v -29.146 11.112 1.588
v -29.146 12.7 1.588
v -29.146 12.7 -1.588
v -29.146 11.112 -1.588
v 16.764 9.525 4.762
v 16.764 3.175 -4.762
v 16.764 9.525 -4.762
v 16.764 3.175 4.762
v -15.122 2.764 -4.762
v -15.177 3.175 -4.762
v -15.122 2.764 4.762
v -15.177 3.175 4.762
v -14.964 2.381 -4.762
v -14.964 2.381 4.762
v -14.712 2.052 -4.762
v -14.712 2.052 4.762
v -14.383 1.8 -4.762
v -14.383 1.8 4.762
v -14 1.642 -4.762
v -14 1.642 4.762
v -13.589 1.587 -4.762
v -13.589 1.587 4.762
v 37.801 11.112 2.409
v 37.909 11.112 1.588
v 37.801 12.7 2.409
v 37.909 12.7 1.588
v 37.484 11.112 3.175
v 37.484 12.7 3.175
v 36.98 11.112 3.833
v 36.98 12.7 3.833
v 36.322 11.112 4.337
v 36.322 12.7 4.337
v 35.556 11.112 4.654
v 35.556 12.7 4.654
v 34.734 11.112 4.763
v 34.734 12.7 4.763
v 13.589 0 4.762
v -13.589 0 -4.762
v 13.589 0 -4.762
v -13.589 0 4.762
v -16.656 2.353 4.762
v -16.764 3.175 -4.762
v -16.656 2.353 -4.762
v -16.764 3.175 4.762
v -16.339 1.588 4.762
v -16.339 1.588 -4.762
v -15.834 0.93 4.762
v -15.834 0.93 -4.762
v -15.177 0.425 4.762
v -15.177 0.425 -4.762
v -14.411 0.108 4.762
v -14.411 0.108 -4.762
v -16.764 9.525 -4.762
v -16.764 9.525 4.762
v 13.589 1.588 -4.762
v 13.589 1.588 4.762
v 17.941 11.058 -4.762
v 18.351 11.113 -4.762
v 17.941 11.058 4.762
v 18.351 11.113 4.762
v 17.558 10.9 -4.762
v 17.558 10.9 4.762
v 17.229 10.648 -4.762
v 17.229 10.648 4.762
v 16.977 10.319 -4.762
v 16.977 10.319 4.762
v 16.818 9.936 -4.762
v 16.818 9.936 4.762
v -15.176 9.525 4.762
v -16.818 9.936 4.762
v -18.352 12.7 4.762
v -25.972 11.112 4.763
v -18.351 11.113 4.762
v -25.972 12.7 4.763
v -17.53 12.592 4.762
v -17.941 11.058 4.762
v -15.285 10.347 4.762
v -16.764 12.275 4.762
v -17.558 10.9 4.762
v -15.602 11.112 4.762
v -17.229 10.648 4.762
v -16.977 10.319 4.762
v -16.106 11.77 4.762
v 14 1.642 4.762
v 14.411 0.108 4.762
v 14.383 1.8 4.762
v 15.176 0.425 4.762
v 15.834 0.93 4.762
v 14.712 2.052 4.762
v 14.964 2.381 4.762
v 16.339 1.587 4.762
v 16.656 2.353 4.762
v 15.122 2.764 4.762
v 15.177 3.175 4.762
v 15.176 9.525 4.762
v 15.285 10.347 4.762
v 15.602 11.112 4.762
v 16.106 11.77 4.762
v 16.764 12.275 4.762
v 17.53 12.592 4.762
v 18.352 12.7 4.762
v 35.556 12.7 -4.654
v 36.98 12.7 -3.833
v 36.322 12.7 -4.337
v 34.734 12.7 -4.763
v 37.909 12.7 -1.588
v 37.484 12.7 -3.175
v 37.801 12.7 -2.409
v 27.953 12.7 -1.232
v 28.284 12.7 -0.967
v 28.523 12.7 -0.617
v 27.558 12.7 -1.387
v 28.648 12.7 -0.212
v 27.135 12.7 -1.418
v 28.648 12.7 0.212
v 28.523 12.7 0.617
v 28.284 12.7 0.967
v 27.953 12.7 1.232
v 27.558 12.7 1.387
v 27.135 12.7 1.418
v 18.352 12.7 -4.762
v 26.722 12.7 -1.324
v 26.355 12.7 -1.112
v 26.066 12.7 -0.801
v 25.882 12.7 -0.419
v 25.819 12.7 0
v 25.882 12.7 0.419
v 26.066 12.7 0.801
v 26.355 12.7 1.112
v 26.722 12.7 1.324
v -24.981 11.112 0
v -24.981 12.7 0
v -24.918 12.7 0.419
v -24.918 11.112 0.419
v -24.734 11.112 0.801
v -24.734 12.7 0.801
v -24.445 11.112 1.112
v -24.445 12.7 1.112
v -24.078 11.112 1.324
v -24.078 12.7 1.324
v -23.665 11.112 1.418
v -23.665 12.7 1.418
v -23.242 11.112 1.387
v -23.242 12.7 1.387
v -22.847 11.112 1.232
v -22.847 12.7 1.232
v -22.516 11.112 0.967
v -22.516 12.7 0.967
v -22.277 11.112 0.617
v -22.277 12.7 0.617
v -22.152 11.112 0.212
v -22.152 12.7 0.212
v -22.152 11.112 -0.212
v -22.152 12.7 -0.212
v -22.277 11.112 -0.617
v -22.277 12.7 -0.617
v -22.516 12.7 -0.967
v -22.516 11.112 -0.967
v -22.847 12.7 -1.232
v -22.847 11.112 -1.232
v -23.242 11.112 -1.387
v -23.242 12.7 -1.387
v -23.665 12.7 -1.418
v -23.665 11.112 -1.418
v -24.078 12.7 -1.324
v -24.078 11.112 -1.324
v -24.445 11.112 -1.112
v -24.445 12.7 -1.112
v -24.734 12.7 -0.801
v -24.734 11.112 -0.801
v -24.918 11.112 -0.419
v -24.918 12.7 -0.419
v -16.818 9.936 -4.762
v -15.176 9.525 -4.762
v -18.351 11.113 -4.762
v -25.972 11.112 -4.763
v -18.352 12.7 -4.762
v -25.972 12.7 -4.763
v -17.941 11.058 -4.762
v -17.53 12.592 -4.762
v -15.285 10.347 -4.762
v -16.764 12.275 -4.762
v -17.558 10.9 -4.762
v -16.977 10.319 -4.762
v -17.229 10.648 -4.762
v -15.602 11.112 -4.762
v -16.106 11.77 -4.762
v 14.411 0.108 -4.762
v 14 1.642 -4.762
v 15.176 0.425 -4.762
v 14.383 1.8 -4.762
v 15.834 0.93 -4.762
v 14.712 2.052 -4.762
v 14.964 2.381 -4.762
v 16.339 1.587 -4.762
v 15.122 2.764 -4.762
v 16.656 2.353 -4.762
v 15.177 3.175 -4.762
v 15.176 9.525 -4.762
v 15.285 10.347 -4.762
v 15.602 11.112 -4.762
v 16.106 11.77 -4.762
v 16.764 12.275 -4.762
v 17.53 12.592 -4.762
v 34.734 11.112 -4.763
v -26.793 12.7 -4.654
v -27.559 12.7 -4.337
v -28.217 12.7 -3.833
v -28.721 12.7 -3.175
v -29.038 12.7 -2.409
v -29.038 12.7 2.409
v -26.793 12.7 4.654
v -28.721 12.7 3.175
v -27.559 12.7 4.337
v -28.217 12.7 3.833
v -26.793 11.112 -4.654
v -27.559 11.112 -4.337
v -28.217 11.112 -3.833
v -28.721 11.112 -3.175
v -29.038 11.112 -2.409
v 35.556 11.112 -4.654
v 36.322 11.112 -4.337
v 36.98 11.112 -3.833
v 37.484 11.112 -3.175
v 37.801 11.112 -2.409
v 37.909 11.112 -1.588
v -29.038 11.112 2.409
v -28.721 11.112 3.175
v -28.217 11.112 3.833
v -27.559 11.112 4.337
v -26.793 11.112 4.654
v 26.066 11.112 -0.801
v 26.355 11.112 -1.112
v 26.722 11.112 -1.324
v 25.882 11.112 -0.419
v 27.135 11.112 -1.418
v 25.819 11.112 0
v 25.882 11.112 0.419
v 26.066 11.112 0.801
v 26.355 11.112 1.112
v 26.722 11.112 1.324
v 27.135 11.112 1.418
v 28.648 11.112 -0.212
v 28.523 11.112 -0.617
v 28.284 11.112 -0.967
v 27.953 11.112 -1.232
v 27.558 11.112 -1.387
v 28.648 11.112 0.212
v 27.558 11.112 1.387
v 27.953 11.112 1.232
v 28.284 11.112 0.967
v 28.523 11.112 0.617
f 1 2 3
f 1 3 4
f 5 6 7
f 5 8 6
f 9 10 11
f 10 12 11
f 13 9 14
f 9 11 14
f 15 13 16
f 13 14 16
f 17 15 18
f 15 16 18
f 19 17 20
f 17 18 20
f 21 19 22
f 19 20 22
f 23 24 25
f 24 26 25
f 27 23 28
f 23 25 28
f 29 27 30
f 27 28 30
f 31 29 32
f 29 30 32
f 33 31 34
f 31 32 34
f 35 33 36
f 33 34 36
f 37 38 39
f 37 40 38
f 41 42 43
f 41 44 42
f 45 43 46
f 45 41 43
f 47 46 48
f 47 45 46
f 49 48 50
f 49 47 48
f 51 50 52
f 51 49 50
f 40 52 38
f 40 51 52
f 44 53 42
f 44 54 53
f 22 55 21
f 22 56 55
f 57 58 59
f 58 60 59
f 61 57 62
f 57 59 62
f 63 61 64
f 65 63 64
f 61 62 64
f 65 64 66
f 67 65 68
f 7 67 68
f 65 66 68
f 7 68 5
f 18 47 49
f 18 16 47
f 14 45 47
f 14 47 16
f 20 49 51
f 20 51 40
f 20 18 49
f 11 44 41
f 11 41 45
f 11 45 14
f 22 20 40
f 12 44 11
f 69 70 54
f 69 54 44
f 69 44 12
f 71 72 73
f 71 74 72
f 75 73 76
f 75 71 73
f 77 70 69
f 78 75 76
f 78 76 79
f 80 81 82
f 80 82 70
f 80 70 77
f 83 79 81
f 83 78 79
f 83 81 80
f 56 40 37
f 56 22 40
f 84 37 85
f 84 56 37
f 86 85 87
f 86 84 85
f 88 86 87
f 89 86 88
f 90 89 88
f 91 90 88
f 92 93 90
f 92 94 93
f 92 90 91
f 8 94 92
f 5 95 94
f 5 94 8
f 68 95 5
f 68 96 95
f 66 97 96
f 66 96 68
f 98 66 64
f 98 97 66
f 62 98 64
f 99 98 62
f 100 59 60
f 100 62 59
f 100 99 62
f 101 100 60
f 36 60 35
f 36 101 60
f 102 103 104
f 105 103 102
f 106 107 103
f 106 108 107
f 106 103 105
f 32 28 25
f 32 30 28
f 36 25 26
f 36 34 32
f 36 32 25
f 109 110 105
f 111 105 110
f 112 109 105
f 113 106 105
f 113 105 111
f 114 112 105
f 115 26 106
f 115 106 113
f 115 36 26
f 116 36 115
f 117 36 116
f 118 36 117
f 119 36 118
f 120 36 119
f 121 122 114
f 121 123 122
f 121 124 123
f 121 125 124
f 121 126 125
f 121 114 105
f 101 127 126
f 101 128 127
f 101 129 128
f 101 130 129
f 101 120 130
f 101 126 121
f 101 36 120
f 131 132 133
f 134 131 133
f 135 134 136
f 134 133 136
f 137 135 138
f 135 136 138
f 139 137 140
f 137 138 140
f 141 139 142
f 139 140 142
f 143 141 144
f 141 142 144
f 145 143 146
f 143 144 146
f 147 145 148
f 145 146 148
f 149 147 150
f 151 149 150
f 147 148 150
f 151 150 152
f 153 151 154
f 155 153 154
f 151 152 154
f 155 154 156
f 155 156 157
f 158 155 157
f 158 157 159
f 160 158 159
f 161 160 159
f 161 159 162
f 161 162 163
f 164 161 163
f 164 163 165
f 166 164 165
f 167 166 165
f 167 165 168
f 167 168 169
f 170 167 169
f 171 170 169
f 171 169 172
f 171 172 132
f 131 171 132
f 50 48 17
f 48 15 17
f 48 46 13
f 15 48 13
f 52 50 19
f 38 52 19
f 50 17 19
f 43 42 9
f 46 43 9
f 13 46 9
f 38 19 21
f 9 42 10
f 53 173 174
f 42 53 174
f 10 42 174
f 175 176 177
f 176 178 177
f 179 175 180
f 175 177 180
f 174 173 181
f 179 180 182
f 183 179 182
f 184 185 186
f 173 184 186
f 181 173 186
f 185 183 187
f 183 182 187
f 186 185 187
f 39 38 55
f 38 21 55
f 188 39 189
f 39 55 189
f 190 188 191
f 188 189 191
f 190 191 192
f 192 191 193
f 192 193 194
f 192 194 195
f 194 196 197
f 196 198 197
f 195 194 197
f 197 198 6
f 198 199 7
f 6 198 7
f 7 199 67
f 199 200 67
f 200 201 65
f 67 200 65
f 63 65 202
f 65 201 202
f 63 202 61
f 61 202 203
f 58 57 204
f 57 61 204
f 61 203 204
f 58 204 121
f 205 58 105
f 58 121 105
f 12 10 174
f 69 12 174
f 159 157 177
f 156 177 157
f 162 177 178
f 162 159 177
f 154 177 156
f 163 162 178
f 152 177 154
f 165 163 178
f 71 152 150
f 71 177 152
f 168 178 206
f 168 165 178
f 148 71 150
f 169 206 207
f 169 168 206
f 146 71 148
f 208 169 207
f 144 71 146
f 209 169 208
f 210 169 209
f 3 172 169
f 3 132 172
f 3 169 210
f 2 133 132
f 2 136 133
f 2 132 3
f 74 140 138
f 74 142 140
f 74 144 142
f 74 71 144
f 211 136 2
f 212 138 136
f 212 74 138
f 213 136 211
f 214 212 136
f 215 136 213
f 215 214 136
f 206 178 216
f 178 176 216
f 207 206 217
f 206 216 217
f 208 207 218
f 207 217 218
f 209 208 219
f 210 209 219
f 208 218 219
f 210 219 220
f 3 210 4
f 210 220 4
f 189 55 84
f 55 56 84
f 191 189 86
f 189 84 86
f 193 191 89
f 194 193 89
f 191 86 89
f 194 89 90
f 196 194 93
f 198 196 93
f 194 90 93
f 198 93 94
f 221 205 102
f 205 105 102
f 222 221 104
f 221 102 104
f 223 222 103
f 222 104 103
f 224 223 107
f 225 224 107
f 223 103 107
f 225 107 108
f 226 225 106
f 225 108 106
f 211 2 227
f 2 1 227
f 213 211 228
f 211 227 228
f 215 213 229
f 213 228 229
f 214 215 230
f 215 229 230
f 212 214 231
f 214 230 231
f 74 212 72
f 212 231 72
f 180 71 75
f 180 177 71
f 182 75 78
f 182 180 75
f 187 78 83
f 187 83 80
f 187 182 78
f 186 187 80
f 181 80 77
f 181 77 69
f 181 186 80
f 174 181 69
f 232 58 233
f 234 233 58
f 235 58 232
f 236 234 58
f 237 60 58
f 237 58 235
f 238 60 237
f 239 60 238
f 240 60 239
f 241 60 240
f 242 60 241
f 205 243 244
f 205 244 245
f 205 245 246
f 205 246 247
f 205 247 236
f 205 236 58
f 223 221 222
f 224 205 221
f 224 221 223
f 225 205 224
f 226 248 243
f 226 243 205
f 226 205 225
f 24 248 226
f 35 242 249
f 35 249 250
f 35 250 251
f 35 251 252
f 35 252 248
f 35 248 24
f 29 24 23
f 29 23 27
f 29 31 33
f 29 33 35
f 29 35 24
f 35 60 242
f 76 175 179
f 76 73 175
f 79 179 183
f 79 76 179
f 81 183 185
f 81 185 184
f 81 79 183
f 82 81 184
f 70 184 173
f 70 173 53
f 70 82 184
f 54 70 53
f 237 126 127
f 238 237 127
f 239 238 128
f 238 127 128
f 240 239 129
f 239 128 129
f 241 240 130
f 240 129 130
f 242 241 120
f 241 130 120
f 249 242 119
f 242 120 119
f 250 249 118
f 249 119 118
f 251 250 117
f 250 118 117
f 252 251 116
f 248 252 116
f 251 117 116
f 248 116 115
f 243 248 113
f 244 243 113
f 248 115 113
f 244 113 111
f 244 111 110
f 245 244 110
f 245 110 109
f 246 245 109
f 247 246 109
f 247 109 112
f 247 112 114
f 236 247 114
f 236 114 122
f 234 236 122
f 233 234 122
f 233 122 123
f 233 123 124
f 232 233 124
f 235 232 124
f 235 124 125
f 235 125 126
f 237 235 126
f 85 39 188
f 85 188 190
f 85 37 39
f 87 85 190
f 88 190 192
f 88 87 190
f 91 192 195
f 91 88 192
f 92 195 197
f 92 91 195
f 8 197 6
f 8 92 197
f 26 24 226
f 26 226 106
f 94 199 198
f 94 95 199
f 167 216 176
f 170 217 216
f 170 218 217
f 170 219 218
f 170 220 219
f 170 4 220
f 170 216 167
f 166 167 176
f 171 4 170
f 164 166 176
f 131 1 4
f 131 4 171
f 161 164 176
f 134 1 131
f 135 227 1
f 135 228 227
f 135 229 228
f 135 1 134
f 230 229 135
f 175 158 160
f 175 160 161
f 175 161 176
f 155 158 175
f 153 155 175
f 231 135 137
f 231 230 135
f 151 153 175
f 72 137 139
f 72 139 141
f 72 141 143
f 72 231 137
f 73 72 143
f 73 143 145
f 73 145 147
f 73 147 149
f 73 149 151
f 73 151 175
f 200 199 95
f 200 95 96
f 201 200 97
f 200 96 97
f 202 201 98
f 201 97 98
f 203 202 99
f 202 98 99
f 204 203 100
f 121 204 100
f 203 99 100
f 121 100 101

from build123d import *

# Parameters (mm, degrees)
BOSS_EXTRUDE1_DEPTH = 4.7625
FILLET1_R           = 1.5875
FILLET2_R           = 3.175
FILLET3_R           = 3.175
HOLE1_D             = 2.8448
HOLE2_D             = 2.8448


with BuildPart() as part:
    # Sketch1 → Boss-Extrude1 (new body, symmetric)
    with BuildSketch(Plane.XY):
        Polygon((-29.1465, 11.1125), (-16.764, 11.1125), (-16.764, 0), (16.764, 0), (16.764, 11.1125), (37.9095, 11.1125), (37.9095, 12.7), (15.1765, 12.7), (15.1765, 1.5875), (-15.1765, 1.5875), (-15.1765, 12.7), (-29.1465, 12.7), align=None)
    extrude(amount=BOSS_EXTRUDE1_DEPTH, both=True)

    # Fillet1
    fillet1_edges = [part.edges().sort_by_distance(p)[0] for p in [
        (-15.1765, 1.5875, 0),
        (15.1765, 1.5875, 0),
        (16.764, 11.1125, 0),
        (-16.764, 11.1125, 0),
    ]]
    fillet(fillet1_edges, radius=FILLET1_R)

    # Fillet2
    fillet2_edges = [part.edges().sort_by_distance(p)[0] for p in [
        (-15.1765, 12.7, 0),
        (15.1765, 12.7, 0),
        (16.764, 0, 0),
        (-16.764, 0, 0),
    ]]
    fillet(fillet2_edges, radius=FILLET2_R)

    # Fillet3
    fillet3_edges = [part.edges().sort_by_distance(p)[0] for p in [
        (37.9095, 11.90625, -4.7625),
        (-29.1465, 11.90625, -4.7625),
        (37.9095, 11.90625, 4.7625),
        (-29.1465, 11.90625, 4.7625),
    ]]
    fillet(fillet3_edges, radius=FILLET3_R)

    # Hole1 (through all)
    with Locations(Plane.XZ.offset(-11.1125)):
        with Locations((27.2415, 0)):
            Hole(HOLE1_D / 2)

    # Hole2 (through all)
    with Locations(Plane.XZ.offset(-11.1125)):
        with Locations((-23.5585, 0)):
            Hole(HOLE2_D / 2)


solid = part.part
